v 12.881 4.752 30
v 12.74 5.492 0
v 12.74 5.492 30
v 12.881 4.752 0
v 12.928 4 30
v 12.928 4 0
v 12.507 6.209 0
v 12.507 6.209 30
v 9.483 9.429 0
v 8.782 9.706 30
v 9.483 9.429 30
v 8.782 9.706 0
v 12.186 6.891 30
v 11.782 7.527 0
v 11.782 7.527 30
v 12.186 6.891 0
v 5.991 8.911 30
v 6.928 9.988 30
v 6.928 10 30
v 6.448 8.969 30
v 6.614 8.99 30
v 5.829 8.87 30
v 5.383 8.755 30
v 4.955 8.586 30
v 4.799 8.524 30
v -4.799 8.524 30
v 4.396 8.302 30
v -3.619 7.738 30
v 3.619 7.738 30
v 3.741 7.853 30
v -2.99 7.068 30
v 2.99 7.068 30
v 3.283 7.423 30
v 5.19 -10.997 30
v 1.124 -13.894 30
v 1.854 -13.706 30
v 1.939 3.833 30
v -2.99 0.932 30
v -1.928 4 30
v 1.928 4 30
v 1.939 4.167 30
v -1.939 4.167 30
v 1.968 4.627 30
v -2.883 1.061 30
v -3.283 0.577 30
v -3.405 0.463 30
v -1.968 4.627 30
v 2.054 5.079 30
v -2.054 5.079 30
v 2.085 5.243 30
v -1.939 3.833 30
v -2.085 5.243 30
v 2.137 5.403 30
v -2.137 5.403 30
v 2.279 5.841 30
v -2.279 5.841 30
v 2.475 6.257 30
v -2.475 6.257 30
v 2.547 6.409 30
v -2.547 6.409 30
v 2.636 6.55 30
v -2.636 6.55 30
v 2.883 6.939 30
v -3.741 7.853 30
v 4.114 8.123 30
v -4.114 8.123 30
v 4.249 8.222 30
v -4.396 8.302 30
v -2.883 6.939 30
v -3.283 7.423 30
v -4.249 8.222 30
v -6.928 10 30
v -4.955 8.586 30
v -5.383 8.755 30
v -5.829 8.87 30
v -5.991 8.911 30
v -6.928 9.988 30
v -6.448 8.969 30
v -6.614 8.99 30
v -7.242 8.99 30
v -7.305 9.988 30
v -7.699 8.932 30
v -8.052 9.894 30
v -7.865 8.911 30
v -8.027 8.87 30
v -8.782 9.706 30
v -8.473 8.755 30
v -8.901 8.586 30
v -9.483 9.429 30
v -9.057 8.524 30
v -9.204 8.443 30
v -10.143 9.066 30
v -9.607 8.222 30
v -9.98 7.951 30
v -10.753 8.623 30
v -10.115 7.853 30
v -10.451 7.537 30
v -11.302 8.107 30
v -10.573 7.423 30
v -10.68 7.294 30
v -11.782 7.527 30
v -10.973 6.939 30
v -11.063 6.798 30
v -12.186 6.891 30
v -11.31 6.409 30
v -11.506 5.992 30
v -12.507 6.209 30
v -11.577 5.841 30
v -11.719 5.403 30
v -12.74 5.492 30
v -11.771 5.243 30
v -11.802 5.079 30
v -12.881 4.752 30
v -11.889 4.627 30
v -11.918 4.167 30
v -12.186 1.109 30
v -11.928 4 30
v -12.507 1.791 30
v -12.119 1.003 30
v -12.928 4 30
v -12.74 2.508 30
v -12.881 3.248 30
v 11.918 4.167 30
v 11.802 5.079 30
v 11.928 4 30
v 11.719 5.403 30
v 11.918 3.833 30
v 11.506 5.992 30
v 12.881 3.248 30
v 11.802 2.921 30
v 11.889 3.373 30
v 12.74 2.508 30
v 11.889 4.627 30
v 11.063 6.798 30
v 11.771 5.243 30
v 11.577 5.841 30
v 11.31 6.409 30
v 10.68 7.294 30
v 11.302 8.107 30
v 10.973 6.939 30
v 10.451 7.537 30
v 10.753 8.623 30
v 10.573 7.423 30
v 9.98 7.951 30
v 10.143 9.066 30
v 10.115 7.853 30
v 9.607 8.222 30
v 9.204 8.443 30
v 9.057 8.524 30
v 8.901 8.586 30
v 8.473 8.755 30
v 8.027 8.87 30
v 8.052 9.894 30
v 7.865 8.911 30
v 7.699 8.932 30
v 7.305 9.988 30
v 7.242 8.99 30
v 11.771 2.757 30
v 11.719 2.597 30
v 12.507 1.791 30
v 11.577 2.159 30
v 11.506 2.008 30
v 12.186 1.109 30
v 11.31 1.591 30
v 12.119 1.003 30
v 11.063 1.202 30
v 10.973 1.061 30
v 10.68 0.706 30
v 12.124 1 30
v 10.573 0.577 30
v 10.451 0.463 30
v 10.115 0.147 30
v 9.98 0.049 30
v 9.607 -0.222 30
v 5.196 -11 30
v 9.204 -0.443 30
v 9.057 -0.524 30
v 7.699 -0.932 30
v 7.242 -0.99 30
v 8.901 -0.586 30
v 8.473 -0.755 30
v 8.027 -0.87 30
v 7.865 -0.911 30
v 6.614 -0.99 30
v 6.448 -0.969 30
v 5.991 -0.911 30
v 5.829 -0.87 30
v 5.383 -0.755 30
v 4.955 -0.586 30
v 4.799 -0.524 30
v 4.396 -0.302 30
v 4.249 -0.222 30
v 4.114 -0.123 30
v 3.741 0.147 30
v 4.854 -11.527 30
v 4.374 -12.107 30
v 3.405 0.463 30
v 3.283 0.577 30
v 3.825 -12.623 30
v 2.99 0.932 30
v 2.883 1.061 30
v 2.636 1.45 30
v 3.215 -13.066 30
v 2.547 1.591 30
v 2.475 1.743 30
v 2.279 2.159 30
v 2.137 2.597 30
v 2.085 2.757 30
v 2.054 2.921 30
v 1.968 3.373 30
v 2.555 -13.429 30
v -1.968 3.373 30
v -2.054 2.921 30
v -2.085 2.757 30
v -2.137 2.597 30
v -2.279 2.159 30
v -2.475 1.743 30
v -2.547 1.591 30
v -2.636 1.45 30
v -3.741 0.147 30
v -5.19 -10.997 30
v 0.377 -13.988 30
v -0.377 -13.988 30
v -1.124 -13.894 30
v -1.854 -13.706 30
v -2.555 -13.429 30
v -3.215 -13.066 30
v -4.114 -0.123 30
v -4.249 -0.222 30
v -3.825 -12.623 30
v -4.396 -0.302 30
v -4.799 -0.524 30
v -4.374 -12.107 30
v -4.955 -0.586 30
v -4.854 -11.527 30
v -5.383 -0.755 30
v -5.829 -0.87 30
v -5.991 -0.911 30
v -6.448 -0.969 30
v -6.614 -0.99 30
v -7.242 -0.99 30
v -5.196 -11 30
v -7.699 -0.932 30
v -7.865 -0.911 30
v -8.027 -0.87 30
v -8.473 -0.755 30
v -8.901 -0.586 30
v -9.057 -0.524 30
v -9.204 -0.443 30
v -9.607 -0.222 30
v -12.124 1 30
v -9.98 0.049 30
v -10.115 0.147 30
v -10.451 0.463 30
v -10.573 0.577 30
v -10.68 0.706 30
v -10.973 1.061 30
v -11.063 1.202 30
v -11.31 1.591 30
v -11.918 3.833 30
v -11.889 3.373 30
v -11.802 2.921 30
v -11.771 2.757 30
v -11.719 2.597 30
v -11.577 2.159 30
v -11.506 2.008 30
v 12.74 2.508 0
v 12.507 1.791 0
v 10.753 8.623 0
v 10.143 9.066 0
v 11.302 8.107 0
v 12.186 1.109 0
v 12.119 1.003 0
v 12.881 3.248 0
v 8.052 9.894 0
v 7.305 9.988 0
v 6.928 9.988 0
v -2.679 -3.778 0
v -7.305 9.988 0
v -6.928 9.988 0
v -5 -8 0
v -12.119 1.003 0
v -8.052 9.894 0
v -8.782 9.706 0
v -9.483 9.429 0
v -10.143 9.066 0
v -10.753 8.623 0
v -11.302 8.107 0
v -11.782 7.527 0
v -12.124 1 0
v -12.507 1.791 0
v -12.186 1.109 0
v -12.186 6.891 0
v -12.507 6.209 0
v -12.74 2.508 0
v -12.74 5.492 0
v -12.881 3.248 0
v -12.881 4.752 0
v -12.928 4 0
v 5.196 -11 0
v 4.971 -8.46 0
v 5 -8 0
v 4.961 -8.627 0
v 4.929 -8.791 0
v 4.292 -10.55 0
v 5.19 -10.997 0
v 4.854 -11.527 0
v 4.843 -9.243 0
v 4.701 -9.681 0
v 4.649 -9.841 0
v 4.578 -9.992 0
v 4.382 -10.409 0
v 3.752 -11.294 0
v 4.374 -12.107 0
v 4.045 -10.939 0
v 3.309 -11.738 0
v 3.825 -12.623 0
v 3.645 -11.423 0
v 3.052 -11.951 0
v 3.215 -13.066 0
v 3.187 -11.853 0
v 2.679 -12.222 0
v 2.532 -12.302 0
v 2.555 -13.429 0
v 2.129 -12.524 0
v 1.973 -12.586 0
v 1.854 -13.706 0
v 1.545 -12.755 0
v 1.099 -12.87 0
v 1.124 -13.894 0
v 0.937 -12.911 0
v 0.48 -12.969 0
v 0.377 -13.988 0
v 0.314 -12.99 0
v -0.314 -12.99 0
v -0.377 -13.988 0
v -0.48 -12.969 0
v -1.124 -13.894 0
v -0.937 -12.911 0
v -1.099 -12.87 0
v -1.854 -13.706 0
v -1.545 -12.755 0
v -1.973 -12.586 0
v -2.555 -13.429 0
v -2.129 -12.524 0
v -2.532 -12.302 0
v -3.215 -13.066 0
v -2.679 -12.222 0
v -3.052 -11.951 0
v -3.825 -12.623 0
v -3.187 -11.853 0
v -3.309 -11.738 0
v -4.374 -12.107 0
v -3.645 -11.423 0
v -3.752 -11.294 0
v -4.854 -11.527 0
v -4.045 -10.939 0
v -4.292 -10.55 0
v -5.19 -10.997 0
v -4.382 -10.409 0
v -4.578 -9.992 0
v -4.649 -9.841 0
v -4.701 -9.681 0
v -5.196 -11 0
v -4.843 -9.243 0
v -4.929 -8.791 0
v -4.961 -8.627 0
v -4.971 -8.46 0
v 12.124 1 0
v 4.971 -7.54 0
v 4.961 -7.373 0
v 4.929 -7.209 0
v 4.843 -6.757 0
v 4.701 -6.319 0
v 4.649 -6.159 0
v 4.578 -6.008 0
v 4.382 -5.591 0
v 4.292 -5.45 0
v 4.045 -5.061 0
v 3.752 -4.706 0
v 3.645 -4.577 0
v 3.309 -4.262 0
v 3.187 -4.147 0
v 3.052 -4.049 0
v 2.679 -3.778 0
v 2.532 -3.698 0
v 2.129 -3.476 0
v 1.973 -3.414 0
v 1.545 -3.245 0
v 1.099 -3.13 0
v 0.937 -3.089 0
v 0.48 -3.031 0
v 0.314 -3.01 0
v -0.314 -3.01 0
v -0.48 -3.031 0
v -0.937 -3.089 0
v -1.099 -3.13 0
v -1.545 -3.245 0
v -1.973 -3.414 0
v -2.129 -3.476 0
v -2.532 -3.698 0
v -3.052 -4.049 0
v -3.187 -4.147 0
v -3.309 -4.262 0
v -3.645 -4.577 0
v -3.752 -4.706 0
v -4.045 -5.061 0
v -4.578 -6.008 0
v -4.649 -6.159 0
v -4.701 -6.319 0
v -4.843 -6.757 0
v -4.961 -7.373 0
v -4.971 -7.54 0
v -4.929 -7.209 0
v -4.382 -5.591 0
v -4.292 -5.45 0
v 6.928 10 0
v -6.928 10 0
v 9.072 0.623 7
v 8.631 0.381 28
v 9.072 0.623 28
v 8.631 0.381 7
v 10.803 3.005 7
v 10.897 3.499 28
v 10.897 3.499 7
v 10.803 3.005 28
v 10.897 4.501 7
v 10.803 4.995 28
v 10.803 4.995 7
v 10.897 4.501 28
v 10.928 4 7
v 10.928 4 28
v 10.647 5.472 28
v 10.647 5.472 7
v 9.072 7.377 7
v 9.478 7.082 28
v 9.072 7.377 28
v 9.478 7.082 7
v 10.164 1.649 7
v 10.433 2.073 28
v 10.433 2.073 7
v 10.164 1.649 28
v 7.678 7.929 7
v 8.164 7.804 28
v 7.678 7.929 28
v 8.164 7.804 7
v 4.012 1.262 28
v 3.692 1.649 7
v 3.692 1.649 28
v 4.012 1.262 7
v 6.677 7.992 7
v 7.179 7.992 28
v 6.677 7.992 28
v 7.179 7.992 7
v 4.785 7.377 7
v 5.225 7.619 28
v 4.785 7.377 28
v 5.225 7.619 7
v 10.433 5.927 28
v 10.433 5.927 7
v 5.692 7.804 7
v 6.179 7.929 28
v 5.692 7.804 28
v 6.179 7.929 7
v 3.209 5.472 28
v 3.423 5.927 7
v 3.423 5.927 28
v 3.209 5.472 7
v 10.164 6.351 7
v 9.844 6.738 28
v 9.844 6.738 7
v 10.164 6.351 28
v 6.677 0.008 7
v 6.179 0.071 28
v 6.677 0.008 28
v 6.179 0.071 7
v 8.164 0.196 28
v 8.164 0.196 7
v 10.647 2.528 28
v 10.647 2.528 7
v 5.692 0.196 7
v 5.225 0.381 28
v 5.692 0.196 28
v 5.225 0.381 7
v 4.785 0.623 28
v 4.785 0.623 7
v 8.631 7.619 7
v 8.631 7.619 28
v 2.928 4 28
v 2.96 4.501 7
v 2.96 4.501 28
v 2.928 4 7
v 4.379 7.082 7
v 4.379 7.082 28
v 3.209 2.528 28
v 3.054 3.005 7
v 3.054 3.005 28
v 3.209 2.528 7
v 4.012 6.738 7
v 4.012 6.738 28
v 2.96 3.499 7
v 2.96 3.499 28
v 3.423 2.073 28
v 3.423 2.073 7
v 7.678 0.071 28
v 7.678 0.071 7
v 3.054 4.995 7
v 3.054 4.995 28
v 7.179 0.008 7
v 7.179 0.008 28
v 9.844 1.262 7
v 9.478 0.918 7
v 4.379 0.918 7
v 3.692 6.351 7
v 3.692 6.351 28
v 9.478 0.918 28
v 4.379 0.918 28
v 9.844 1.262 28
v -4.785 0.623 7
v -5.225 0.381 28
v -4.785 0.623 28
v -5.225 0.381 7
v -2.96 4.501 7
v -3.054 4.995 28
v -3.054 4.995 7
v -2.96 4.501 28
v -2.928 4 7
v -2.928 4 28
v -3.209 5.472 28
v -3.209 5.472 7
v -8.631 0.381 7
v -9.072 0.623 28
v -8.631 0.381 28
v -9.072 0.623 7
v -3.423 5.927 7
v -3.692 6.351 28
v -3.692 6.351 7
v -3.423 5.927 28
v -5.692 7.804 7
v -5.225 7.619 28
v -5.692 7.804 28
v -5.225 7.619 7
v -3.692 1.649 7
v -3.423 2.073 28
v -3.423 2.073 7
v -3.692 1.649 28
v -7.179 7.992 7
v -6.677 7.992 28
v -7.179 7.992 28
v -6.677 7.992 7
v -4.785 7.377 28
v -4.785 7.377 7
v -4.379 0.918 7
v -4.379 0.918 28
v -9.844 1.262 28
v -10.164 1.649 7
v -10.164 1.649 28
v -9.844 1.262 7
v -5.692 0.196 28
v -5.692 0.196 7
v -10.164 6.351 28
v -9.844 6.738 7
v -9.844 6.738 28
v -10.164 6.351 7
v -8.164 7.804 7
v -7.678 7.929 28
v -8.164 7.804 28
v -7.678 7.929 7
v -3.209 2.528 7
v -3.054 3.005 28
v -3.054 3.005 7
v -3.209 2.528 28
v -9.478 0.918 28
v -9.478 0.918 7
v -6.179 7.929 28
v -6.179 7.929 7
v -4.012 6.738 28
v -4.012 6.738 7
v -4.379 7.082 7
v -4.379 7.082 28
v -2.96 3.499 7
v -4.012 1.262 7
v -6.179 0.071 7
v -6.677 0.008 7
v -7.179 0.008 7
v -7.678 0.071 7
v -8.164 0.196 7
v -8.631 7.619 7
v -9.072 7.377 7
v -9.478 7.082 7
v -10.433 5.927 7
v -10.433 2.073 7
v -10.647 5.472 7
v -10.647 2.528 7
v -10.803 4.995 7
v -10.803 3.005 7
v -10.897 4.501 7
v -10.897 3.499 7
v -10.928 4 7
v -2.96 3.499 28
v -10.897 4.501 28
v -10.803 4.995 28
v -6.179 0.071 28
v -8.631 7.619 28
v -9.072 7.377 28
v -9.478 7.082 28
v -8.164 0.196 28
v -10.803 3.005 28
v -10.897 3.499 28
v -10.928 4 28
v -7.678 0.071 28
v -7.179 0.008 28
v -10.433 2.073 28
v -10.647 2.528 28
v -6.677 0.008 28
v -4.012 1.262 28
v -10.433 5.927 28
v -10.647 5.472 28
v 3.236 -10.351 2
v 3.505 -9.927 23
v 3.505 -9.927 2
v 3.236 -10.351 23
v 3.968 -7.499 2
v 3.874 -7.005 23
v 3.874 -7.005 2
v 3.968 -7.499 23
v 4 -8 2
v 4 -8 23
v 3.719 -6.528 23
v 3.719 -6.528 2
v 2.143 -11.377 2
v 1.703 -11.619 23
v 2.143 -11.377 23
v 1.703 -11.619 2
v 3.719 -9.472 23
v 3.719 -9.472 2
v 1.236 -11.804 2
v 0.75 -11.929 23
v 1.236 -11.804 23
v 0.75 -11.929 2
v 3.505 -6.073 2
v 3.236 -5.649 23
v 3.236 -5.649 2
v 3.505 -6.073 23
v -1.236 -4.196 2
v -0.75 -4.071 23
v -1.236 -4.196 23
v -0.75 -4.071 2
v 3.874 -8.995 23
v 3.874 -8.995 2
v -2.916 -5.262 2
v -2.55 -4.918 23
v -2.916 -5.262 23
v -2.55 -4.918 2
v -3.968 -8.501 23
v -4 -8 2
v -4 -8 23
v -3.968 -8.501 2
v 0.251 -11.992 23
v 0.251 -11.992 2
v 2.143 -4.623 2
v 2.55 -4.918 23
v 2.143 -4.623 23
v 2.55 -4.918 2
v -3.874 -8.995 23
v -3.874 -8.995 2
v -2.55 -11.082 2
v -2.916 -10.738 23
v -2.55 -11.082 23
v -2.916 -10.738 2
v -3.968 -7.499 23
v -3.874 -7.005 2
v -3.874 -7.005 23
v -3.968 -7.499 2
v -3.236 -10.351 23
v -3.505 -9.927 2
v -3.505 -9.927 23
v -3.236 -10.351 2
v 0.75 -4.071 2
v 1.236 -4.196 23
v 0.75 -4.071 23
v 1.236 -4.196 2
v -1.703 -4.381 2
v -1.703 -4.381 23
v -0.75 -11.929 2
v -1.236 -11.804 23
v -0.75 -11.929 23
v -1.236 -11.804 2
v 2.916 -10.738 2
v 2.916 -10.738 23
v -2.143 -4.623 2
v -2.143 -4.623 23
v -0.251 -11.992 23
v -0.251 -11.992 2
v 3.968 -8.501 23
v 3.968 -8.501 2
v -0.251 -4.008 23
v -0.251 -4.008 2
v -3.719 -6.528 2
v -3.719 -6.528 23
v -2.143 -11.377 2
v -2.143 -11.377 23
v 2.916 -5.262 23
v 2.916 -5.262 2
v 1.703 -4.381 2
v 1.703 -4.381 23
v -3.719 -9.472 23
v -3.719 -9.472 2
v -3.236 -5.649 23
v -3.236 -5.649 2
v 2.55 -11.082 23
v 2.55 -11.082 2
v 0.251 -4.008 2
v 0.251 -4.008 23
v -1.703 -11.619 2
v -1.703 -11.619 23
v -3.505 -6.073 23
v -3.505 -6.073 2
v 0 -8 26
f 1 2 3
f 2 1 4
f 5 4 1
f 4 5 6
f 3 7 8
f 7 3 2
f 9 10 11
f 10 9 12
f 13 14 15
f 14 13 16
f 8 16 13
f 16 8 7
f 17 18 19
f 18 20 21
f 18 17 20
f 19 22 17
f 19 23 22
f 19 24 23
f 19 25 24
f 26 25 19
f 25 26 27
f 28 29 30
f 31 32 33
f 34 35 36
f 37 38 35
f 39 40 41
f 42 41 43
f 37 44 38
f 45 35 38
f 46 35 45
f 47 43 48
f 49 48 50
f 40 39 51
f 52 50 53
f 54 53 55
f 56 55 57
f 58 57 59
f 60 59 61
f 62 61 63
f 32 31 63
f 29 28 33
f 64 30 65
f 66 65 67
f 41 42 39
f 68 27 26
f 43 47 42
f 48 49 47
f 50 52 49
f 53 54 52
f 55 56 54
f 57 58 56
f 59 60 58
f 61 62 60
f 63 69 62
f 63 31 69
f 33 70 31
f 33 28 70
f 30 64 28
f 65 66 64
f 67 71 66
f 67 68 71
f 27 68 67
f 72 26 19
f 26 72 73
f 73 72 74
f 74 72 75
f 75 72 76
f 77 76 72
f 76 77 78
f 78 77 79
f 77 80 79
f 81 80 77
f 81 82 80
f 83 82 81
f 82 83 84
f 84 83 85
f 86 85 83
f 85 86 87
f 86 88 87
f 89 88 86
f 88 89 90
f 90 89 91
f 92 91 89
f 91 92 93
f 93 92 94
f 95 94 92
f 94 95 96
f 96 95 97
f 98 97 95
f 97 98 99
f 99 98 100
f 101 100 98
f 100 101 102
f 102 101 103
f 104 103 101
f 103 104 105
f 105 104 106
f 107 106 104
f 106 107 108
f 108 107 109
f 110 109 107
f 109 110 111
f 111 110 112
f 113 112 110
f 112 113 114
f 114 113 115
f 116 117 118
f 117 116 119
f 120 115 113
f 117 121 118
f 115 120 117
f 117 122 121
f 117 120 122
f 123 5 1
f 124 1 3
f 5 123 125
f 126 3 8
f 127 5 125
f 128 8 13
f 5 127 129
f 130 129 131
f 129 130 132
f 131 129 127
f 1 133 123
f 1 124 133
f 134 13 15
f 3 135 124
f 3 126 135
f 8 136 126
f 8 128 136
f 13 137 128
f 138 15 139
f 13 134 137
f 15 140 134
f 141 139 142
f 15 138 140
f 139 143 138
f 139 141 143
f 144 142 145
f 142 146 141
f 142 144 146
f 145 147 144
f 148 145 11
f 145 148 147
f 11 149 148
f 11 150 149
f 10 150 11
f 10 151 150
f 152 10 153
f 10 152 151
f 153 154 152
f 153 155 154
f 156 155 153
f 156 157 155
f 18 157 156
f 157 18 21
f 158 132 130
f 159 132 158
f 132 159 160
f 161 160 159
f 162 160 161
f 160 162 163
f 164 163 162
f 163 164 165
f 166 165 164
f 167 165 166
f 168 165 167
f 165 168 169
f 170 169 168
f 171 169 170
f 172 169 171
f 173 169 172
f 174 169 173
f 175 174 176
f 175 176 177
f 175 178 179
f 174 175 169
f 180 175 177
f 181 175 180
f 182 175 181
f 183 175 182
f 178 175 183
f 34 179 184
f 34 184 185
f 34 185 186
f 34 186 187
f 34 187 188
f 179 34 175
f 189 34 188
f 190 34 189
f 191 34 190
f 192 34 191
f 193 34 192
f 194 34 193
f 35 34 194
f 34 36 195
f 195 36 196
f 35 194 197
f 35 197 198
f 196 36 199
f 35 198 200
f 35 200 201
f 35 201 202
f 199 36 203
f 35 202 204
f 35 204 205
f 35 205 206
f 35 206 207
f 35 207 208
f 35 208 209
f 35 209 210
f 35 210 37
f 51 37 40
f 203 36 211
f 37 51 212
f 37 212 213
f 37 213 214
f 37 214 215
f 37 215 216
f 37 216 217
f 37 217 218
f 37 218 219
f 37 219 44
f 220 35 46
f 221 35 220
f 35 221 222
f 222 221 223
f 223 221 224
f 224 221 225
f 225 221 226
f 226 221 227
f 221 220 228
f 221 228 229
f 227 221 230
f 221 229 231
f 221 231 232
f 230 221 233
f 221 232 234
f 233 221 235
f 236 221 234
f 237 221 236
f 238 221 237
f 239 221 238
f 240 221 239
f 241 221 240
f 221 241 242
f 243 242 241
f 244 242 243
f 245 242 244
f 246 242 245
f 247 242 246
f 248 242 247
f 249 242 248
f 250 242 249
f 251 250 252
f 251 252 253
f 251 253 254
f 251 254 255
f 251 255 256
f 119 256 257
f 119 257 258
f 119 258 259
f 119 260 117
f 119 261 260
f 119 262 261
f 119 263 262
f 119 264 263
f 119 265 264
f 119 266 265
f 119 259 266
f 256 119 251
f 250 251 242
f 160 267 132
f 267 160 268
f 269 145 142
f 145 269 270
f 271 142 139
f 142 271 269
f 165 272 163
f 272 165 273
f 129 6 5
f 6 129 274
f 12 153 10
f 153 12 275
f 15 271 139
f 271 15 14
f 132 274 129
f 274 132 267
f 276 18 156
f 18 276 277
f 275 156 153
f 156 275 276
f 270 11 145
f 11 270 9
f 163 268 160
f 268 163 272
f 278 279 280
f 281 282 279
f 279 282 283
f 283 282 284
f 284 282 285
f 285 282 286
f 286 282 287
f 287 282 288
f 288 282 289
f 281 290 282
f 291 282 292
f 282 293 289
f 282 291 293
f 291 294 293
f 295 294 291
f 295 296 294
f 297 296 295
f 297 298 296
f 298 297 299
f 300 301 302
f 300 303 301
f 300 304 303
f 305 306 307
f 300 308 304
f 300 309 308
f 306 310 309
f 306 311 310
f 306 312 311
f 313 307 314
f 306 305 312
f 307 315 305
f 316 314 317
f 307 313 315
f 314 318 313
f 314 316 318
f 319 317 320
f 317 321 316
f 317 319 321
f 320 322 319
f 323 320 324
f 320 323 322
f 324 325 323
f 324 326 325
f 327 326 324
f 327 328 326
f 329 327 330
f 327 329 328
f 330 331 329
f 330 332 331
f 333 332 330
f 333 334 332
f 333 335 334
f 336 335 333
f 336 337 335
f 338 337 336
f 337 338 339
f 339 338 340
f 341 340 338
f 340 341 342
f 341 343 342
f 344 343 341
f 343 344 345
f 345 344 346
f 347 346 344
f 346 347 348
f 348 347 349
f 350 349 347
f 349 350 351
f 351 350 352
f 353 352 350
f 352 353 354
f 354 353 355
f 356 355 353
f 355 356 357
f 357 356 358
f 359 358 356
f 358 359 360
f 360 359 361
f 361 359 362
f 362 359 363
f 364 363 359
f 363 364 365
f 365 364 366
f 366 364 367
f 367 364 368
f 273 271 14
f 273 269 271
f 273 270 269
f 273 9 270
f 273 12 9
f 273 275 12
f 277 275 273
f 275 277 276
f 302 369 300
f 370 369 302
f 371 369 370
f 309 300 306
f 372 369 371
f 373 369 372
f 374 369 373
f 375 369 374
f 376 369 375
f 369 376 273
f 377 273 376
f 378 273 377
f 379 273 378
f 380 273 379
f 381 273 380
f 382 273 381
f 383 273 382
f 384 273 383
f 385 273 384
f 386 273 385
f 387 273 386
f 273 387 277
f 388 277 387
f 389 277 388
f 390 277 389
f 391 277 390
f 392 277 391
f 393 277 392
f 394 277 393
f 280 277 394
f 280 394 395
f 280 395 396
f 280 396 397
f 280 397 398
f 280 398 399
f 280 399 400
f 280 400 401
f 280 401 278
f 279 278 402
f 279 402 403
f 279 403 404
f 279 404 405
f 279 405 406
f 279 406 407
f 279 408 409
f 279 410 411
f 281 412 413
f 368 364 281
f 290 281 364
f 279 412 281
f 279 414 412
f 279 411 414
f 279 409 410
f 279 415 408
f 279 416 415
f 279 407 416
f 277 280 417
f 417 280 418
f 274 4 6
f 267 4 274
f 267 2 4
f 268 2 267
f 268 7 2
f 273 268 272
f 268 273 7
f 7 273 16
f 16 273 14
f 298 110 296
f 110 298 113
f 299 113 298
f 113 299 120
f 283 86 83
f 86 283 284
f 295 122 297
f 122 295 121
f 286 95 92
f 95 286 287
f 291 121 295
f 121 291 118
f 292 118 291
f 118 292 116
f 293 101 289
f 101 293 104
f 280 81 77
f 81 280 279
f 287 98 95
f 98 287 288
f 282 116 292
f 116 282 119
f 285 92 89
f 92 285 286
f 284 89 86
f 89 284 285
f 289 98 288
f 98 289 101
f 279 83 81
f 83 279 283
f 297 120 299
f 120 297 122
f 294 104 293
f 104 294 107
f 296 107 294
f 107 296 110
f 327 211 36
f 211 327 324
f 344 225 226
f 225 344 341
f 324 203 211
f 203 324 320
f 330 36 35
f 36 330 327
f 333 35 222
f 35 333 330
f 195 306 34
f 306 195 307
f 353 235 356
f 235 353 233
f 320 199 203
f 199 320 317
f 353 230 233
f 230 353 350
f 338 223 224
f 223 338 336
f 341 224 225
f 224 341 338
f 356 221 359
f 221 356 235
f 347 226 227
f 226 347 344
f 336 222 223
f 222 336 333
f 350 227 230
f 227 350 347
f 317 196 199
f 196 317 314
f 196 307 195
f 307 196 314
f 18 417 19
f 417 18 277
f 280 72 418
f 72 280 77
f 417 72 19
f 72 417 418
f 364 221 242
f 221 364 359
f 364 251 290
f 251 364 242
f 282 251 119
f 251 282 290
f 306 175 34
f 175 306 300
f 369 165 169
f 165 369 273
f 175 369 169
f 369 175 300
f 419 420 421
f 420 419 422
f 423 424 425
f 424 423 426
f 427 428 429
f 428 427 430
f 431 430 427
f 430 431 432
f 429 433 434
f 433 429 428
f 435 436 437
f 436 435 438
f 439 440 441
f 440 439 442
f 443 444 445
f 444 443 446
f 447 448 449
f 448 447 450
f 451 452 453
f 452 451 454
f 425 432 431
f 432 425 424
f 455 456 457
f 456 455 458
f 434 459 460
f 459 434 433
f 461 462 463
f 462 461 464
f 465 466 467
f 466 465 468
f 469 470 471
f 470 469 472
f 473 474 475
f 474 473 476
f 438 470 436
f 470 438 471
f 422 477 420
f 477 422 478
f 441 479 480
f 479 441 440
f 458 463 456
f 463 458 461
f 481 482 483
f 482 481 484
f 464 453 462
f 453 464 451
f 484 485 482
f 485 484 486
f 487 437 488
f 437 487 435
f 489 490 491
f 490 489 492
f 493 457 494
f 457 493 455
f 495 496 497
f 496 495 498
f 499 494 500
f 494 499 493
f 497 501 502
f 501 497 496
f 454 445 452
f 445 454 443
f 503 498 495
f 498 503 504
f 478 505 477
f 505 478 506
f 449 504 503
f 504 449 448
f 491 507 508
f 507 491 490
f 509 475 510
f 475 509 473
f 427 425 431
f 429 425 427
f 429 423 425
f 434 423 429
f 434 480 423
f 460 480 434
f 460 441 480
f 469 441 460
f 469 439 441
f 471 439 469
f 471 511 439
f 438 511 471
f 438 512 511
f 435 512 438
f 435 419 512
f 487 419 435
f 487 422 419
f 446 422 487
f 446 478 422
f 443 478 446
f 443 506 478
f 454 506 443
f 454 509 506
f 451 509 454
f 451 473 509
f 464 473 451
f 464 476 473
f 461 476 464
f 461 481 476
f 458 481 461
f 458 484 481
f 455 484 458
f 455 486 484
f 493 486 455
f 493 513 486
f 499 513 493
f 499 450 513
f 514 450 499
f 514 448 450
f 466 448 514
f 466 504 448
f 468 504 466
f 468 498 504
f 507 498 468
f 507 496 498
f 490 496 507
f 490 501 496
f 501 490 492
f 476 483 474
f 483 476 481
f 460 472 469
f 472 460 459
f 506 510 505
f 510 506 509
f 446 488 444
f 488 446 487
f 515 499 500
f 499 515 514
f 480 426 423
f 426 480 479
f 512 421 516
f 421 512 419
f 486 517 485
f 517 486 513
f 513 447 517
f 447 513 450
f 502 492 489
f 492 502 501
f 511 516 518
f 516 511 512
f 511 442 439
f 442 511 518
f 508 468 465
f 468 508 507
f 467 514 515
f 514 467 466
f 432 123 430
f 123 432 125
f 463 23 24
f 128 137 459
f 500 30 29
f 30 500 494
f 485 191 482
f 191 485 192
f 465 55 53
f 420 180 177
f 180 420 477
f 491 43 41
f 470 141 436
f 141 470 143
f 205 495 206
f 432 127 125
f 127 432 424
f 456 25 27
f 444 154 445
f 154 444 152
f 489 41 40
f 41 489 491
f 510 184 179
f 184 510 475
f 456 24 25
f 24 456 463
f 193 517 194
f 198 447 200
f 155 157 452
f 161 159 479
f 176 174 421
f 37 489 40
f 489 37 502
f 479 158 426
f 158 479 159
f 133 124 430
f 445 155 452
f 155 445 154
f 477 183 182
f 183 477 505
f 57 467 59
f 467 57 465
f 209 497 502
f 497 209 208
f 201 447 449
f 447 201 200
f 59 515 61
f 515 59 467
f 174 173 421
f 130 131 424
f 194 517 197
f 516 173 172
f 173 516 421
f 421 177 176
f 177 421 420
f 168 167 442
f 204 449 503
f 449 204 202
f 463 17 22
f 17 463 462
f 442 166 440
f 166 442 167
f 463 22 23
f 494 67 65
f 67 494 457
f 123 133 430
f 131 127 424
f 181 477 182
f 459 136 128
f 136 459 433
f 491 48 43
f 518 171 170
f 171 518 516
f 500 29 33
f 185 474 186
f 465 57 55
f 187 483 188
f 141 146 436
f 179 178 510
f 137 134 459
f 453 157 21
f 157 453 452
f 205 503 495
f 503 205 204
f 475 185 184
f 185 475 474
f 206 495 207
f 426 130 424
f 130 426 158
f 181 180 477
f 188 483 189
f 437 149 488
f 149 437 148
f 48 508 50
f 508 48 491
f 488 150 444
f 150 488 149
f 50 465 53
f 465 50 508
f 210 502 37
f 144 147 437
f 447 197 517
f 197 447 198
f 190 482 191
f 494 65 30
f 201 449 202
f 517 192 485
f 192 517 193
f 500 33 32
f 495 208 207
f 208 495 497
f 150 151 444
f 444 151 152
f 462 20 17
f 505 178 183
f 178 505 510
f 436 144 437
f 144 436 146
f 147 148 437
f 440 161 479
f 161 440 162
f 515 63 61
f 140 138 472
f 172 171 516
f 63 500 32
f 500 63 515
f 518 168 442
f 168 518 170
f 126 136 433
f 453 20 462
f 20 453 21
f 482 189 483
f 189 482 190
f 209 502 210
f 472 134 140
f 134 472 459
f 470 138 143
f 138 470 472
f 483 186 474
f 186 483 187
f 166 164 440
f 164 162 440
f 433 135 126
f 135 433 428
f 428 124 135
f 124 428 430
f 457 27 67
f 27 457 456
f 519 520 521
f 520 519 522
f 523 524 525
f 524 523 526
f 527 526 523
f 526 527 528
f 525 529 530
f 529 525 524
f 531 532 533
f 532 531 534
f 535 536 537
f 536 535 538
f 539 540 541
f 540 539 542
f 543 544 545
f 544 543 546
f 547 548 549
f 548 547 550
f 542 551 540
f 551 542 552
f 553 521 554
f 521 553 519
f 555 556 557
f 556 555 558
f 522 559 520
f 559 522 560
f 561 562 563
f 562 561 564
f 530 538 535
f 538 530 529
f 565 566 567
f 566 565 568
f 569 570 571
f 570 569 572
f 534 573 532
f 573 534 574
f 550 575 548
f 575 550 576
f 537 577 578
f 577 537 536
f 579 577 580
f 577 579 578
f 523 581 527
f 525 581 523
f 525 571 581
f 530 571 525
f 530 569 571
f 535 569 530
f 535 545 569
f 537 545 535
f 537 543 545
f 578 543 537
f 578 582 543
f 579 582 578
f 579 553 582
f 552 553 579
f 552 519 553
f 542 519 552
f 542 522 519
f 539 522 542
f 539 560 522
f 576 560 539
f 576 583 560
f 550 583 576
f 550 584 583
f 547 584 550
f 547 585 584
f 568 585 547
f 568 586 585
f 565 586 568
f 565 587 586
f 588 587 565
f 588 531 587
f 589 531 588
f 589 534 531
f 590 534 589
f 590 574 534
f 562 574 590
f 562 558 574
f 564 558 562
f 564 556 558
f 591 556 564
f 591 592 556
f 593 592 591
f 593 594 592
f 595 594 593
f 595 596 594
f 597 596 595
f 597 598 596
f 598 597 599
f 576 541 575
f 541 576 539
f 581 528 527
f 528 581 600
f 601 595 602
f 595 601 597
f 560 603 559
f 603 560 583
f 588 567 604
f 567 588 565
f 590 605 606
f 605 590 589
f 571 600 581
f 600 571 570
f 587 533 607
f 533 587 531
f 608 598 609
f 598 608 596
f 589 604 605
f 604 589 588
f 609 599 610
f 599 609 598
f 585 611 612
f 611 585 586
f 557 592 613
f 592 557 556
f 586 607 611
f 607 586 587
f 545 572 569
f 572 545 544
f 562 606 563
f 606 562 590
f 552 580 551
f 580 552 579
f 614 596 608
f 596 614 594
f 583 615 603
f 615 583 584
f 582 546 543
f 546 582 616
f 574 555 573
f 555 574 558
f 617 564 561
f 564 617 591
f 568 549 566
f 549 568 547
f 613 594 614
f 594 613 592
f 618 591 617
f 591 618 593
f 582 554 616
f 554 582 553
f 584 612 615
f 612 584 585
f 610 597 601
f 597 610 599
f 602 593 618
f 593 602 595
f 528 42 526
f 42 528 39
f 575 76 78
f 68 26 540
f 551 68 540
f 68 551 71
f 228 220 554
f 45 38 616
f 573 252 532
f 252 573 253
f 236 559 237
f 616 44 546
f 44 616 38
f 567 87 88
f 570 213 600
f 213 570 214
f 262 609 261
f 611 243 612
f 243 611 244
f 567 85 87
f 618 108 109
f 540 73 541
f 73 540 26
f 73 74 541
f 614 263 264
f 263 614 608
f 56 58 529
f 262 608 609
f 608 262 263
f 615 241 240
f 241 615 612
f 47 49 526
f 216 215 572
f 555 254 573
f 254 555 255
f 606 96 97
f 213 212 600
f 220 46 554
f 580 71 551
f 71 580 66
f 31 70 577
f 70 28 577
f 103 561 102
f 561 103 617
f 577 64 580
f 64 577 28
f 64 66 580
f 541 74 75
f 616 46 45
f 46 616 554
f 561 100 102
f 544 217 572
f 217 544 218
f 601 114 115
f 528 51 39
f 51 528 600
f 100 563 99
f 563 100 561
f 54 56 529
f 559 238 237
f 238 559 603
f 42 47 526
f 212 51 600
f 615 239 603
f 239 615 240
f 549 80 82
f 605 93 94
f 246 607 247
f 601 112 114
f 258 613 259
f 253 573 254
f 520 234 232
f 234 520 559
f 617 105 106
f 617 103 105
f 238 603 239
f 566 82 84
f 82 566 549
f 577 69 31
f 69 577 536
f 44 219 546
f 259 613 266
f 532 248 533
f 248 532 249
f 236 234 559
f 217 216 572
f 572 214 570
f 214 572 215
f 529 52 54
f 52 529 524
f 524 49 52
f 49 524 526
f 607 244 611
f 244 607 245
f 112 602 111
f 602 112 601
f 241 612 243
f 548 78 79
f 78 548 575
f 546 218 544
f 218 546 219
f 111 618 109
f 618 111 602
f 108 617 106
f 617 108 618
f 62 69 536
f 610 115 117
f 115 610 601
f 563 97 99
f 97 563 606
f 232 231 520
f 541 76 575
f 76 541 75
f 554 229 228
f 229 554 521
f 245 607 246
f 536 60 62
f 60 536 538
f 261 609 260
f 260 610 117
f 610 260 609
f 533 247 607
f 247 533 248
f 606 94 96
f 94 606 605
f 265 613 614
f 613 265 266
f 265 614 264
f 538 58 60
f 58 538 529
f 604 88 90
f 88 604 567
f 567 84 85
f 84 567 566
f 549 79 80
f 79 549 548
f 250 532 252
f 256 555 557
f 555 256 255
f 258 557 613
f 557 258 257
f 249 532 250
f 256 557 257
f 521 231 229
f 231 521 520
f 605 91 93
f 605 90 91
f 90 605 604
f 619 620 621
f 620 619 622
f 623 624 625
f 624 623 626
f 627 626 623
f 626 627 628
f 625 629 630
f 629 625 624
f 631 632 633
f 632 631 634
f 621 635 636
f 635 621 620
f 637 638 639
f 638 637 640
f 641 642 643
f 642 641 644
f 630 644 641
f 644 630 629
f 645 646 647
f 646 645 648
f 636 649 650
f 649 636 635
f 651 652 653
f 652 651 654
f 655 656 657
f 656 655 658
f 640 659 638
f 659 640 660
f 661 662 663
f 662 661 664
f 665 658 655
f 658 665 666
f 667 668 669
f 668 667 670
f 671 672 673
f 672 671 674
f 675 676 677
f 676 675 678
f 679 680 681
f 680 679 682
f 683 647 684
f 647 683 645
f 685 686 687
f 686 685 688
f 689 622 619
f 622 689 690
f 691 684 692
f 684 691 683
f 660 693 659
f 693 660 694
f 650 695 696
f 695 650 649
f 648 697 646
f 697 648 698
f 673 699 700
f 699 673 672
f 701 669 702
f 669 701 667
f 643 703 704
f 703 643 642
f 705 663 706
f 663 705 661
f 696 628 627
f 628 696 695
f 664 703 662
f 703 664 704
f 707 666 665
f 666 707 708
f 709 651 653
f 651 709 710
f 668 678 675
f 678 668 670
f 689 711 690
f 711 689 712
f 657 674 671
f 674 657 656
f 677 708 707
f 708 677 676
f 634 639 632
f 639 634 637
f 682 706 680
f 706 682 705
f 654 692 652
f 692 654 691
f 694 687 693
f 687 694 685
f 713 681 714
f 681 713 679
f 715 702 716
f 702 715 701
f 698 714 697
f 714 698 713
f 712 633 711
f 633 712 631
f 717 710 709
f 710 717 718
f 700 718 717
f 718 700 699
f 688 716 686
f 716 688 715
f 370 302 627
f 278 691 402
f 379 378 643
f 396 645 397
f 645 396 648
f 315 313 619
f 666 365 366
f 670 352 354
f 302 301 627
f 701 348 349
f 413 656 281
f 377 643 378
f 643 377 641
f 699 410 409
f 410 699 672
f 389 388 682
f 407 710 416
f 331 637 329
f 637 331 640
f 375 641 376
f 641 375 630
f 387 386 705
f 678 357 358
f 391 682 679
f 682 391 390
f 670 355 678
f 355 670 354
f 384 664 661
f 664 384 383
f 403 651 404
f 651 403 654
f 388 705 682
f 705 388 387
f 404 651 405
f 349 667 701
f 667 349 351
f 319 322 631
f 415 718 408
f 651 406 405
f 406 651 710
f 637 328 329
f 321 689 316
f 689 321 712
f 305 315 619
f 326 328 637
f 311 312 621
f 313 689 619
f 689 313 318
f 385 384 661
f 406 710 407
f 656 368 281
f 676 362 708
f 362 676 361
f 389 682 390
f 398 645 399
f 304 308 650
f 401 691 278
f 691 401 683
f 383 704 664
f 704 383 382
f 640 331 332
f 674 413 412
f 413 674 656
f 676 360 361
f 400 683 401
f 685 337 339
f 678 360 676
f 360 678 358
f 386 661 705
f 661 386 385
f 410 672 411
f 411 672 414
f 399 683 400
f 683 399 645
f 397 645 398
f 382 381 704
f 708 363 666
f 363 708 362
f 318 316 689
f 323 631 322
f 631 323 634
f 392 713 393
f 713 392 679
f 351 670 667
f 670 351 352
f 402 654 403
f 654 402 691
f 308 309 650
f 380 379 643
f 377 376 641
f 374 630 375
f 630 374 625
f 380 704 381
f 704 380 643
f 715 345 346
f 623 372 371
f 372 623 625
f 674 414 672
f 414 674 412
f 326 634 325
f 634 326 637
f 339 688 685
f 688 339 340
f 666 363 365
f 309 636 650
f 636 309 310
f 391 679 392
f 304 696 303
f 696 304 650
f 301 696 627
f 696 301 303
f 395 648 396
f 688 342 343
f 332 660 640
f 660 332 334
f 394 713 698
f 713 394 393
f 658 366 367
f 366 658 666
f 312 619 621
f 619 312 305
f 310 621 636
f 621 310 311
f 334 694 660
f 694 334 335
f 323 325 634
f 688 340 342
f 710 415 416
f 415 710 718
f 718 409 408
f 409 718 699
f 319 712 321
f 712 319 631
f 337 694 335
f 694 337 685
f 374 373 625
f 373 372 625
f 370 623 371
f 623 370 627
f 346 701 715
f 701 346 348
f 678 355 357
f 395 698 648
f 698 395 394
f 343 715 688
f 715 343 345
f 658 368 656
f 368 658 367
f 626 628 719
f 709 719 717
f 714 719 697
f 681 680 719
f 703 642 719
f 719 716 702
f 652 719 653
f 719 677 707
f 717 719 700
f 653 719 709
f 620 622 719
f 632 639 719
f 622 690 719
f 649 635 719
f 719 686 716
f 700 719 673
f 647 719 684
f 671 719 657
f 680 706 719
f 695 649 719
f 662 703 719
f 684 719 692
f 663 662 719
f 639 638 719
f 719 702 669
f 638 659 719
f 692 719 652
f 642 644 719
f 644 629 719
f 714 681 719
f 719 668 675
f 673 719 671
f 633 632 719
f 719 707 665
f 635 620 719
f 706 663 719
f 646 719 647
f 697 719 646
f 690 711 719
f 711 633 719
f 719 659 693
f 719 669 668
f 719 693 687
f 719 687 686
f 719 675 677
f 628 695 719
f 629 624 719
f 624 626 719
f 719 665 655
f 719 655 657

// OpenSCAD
/* [Hidden] */
$fn=50;

/* [Parameters] */
// Cylinder distance from center
a=8;
// Outside diameter
b=12;
// Inside diameter
c=8;
// Height
e=30;   

difference(){
    union(){
        translate([a*sqrt(3)/2,a/2,0]) cylinder(d=b,h=e);
        translate([-a*sqrt(3)/2,a/2,0]) cylinder(d=b,h=e);
        translate([0,-a,0]) cylinder(d=b,h=e);
        translate([-a*sqrt(3)/2,0,0]) cube([a*sqrt(3),(a+b)/2,e]);
        rotate(v=[0,0,1],a=120) translate([-a*sqrt(3)/2,0,0]) cube([a*sqrt(3),(a+b)/2,e]);
        rotate(v=[0,0,1],a=-120) translate([-a*sqrt(3)/2,0,0]) cube([a*sqrt(3),(a+b)/2,e]);   
    };  
    translate([a*sqrt(3)/2,a/2,7]) cylinder(d=c,h=e);
    translate([a*sqrt(3)/2,a/2,e-2]) cylinder(d1=c,d2=c+3,h=3);    
    translate([-a*sqrt(3)/2,a/2,7]) cylinder(d=c,h=e);
    translate([-a*sqrt(3)/2,a/2,e-2]) cylinder(d1=c,d2=c+3,h=3);
    translate([0,-a,-7]) cylinder(d=c,h=e);
    translate([0,-a,-1]) cylinder(d2=c,d1=c+3,h=3);
    translate([0,-a,e-7]) cylinder(d1=c,d2=0,h=3);
};
